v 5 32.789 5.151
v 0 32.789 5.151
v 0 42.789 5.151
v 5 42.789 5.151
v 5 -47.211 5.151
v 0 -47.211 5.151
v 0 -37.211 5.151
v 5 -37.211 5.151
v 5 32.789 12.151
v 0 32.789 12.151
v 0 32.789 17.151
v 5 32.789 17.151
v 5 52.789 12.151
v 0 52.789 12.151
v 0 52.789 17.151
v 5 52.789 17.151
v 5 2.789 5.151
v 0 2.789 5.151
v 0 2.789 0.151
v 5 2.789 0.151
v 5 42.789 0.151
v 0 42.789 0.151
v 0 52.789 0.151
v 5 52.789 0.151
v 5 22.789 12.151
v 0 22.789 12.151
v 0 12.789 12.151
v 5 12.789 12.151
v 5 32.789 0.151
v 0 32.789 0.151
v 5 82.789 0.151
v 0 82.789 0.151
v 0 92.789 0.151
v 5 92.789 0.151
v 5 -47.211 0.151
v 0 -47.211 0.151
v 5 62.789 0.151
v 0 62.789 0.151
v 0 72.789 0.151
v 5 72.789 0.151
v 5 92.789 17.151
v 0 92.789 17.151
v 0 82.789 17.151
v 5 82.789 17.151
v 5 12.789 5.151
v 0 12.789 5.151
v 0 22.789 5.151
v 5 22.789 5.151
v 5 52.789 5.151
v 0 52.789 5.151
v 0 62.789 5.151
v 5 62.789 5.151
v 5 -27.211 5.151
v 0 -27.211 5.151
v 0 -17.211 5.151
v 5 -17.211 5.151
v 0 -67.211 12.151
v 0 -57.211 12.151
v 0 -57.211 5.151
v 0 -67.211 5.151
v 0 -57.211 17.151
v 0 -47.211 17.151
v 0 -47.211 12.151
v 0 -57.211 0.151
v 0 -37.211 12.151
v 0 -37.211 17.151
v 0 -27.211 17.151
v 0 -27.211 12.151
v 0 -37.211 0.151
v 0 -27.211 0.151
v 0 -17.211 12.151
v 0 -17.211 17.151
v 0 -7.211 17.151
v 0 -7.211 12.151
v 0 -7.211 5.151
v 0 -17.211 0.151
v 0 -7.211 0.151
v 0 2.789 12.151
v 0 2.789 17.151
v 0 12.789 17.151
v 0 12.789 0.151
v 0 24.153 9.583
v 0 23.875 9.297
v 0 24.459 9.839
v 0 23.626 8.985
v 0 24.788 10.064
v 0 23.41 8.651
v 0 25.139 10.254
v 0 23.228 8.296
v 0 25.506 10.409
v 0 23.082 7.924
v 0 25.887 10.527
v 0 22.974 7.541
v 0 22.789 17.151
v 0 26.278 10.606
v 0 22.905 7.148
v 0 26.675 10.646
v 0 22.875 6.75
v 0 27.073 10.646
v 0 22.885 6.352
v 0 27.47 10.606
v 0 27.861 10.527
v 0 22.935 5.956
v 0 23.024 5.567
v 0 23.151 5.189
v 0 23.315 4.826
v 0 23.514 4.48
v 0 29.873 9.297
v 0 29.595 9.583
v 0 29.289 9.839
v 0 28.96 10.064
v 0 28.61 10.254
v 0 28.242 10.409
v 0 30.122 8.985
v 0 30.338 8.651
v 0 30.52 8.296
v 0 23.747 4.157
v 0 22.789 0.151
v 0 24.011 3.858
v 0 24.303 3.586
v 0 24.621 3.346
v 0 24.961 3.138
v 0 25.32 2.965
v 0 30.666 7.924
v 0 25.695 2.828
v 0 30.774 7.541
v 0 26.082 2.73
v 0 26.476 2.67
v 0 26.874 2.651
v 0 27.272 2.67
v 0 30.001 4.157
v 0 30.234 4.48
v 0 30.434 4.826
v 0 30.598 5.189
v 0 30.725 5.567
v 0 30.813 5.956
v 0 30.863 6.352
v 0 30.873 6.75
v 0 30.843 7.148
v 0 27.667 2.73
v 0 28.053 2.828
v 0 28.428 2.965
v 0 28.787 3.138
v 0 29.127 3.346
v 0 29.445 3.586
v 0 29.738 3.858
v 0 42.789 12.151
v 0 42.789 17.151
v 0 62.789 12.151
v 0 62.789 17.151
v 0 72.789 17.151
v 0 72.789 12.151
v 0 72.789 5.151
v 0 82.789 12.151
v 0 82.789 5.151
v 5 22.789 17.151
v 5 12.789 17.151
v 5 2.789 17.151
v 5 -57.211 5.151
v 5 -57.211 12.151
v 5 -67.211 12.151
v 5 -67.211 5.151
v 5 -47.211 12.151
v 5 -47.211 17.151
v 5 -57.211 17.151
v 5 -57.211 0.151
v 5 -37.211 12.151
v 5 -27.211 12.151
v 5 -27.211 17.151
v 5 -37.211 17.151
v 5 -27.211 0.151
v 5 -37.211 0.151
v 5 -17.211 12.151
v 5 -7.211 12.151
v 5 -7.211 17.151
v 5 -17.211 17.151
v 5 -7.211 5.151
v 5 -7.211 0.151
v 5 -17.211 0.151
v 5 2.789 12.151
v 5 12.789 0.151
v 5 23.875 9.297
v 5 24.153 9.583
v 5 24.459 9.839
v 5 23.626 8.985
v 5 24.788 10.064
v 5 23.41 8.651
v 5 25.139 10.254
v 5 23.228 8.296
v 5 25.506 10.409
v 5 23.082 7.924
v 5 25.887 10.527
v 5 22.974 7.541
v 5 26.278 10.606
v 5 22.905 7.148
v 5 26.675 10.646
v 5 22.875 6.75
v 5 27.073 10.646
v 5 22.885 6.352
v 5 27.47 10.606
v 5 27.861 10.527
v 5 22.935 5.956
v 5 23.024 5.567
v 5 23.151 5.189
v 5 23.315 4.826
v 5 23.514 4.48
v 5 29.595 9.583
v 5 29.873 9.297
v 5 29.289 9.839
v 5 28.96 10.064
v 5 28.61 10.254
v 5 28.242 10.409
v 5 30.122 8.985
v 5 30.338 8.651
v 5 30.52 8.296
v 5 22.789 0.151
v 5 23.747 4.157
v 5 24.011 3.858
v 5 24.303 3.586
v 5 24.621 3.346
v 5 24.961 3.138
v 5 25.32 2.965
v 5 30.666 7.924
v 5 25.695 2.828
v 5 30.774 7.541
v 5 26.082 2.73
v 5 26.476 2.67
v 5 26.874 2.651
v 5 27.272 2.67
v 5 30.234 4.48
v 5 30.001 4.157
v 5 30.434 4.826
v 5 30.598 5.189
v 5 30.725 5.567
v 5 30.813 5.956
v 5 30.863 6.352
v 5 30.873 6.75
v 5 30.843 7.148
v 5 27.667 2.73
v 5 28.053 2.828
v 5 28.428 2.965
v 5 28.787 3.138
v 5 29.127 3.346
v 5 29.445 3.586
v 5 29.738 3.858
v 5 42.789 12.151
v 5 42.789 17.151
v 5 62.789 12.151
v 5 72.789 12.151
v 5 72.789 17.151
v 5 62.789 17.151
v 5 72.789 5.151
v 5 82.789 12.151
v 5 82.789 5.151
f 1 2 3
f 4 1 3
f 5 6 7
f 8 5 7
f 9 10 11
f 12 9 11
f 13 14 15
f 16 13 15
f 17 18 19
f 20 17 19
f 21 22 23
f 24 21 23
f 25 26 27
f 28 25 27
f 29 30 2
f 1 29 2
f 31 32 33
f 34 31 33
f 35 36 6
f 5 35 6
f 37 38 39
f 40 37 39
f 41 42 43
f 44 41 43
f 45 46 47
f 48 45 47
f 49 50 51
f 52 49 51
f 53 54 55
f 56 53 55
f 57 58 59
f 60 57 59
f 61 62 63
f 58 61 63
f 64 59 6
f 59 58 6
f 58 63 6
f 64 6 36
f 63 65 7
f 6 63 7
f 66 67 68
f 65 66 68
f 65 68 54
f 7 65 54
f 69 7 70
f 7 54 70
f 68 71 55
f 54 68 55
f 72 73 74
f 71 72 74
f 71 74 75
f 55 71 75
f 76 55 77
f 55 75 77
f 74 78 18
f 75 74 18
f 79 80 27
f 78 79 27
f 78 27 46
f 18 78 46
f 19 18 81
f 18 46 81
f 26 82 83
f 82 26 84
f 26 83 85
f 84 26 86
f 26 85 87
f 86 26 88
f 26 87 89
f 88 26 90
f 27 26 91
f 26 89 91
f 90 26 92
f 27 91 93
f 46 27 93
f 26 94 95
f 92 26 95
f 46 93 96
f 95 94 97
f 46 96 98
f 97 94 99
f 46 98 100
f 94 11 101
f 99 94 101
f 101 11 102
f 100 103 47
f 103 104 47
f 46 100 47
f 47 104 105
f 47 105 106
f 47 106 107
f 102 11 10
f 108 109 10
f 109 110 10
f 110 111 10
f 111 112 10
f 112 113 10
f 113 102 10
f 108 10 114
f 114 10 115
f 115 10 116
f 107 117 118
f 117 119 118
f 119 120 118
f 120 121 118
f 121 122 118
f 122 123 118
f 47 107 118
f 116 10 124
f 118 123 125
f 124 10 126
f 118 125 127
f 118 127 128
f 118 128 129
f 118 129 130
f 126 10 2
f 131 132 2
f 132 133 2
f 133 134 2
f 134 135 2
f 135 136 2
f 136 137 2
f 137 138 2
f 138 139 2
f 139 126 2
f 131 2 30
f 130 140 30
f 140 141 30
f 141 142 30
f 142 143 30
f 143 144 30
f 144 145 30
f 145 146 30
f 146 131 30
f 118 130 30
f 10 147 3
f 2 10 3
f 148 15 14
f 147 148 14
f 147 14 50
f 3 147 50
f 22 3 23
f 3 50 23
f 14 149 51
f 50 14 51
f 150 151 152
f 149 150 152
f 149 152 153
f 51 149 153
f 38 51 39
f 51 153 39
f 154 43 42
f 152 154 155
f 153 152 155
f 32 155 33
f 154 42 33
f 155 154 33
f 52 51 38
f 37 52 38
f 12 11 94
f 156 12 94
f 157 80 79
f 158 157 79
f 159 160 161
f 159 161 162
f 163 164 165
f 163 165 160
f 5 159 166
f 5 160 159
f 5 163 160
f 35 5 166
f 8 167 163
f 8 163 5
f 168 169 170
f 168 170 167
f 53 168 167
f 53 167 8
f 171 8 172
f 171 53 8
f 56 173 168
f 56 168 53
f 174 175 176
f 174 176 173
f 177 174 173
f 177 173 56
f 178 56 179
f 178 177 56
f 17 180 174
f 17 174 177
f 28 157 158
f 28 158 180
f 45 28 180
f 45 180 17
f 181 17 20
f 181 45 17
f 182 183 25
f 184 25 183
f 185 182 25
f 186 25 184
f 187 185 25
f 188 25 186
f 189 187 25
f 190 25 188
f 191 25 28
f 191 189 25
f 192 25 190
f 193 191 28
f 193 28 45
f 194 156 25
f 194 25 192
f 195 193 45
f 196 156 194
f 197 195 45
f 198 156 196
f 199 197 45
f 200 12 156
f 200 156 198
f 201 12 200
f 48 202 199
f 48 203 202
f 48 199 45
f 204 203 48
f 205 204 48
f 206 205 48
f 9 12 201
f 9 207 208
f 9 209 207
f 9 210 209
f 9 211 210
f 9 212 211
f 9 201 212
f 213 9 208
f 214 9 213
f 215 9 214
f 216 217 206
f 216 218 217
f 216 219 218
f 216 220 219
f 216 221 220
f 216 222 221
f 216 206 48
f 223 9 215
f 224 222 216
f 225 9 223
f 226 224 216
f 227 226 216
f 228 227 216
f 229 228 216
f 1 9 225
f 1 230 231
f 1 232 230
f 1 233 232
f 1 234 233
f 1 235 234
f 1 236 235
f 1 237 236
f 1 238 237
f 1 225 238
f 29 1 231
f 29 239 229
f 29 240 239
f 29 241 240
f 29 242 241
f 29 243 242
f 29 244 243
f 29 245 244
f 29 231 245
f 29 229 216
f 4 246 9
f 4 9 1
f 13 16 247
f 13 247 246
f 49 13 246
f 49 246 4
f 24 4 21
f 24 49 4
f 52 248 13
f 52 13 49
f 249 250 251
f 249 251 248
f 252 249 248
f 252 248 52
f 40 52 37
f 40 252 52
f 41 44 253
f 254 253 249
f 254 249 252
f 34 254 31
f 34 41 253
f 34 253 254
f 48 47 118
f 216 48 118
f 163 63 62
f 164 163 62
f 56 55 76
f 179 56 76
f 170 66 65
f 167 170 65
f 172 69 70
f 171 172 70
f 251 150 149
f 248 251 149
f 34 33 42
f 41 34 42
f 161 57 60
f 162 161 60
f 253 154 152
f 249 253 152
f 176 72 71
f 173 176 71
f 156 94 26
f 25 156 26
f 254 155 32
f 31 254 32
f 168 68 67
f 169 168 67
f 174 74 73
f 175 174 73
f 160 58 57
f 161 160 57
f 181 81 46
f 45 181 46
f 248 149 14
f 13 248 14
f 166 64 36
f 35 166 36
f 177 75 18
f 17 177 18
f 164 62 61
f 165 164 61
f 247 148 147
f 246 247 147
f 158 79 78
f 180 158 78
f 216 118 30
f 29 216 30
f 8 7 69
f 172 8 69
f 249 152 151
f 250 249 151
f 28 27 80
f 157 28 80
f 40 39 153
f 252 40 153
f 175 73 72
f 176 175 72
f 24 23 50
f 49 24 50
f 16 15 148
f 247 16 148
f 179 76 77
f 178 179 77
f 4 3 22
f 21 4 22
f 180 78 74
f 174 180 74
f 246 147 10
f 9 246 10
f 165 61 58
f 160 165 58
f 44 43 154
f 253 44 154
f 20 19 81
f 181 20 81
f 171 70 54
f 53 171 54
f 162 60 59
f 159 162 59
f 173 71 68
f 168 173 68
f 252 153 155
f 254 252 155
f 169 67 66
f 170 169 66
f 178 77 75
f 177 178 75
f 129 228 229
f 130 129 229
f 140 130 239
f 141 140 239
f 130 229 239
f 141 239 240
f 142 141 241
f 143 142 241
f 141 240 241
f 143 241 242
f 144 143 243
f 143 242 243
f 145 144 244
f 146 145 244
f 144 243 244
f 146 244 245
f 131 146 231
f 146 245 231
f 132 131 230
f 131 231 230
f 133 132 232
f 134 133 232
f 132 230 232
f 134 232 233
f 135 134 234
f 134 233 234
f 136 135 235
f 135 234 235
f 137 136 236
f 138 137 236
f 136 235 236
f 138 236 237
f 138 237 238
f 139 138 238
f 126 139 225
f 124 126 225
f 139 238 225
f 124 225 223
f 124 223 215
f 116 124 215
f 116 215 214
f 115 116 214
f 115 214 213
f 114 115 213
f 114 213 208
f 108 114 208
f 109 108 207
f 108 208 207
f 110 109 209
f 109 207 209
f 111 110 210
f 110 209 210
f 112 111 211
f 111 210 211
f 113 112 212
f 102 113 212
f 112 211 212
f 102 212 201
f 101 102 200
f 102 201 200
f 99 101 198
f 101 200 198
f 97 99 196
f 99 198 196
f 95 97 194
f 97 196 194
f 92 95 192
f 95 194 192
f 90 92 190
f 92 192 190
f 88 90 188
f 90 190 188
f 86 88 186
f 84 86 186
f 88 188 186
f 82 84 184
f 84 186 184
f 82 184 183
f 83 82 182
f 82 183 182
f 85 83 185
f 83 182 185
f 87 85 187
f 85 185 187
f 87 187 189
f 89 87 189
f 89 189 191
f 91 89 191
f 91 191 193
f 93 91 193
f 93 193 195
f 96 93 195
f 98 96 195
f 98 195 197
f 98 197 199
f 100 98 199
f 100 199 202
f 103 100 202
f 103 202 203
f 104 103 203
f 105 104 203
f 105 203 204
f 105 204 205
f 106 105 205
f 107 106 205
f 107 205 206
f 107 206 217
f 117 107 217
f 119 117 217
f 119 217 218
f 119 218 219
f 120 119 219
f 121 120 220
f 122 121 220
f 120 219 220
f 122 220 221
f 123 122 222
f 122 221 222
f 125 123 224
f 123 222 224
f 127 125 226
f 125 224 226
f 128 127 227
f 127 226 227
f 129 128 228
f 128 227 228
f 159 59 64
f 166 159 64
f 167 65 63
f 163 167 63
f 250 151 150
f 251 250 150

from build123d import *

# Parameters (mm, degrees)
SALIENTE_EXTRUIR1_DEPTH = 5
CROQUIS2_R              = 4
CORTAR_EXTRUIR1_DEPTH   = 5


with BuildPart() as part:
    # Croquis1 → Saliente-Extruir1 (new body)
    with BuildSketch(Plane(origin=(0, 0, 0), x_dir=(0, 0, -1), z_dir=(1, 0, 0))):
        Polygon((-17.15051747, 72.789115646), (-17.15051747, 62.789115646), (-12.15051747, 62.789115646), (-12.15051747, 52.789115646), (-17.15051747, 52.789115646), (-17.15051747, 42.789115646), (-12.15051747, 42.789115646), (-12.15051747, 32.789115646), (-17.15051747, 32.789115646), (-17.15051747, 22.789115646), (-12.15051747, 22.789115646), (-12.15051747, 12.789115646), (-17.15051747, 12.789115646), (-17.15051747, 2.789115646), (-12.15051747, 2.789115646), (-12.15051747, -7.210884354), (-17.15051747, -7.210884354), (-17.15051747, -17.210884354), (-12.15051747, -17.210884354), (-12.15051747, -27.210884354), (-17.15051747, -27.210884354), (-17.15051747, -37.210884354), (-12.15051747, -37.210884354), (-12.15051747, -47.210884354), (-17.15051747, -47.210884354), (-17.15051747, -57.210884354), (-12.15051747, -57.210884354), (-12.15051747, -67.210884354), (-5.15051747, -67.210884354), (-5.15051747, -57.210884354), (-0.15051747, -57.210884354), (-0.15051747, -47.210884354), (-5.15051747, -47.210884354), (-5.15051747, -37.210884354), (-0.15051747, -37.210884354), (-0.15051747, -27.210884354), (-5.15051747, -27.210884354), (-5.15051747, -17.210884354), (-0.15051747, -17.210884354), (-0.15051747, -7.210884354), (-5.15051747, -7.210884354), (-5.15051747, 2.789115646), (-0.15051747, 2.789115646), (-0.15051747, 12.789115646), (-5.15051747, 12.789115646), (-5.15051747, 22.789115646), (-0.15051747, 22.789115646), (-0.15051747, 32.789115646), (-5.15051747, 32.789115646), (-5.15051747, 42.789115646), (-0.15051747, 42.789115646), (-0.15051747, 52.789115646), (-5.15051747, 52.789115646), (-5.15051747, 62.789115646), (-0.15051747, 62.789115646), (-0.15051747, 72.789115646), (-5.15051747, 72.789115646), (-5.15051747, 82.789115646), (-0.15051747, 82.789115646), (-0.15051747, 92.789115646), (-17.15051747, 92.789115646), (-17.15051747, 82.789115646), (-12.15051747, 82.789115646), (-12.15051747, 72.789115646), align=None)
    extrude(amount=SALIENTE_EXTRUIR1_DEPTH)

    # Croquis2 → Cortar-Extruir1 (cut)
    with BuildSketch(Plane(origin=(5, 0, 0), x_dir=(0, 0, -1), z_dir=(1, 0, 0))):
        with Locations((-6.65051747, 26.874115646)):
            Circle(CROQUIS2_R)
    extrude(amount=-CORTAR_EXTRUIR1_DEPTH, mode=Mode.SUBTRACT)


solid = part.part
